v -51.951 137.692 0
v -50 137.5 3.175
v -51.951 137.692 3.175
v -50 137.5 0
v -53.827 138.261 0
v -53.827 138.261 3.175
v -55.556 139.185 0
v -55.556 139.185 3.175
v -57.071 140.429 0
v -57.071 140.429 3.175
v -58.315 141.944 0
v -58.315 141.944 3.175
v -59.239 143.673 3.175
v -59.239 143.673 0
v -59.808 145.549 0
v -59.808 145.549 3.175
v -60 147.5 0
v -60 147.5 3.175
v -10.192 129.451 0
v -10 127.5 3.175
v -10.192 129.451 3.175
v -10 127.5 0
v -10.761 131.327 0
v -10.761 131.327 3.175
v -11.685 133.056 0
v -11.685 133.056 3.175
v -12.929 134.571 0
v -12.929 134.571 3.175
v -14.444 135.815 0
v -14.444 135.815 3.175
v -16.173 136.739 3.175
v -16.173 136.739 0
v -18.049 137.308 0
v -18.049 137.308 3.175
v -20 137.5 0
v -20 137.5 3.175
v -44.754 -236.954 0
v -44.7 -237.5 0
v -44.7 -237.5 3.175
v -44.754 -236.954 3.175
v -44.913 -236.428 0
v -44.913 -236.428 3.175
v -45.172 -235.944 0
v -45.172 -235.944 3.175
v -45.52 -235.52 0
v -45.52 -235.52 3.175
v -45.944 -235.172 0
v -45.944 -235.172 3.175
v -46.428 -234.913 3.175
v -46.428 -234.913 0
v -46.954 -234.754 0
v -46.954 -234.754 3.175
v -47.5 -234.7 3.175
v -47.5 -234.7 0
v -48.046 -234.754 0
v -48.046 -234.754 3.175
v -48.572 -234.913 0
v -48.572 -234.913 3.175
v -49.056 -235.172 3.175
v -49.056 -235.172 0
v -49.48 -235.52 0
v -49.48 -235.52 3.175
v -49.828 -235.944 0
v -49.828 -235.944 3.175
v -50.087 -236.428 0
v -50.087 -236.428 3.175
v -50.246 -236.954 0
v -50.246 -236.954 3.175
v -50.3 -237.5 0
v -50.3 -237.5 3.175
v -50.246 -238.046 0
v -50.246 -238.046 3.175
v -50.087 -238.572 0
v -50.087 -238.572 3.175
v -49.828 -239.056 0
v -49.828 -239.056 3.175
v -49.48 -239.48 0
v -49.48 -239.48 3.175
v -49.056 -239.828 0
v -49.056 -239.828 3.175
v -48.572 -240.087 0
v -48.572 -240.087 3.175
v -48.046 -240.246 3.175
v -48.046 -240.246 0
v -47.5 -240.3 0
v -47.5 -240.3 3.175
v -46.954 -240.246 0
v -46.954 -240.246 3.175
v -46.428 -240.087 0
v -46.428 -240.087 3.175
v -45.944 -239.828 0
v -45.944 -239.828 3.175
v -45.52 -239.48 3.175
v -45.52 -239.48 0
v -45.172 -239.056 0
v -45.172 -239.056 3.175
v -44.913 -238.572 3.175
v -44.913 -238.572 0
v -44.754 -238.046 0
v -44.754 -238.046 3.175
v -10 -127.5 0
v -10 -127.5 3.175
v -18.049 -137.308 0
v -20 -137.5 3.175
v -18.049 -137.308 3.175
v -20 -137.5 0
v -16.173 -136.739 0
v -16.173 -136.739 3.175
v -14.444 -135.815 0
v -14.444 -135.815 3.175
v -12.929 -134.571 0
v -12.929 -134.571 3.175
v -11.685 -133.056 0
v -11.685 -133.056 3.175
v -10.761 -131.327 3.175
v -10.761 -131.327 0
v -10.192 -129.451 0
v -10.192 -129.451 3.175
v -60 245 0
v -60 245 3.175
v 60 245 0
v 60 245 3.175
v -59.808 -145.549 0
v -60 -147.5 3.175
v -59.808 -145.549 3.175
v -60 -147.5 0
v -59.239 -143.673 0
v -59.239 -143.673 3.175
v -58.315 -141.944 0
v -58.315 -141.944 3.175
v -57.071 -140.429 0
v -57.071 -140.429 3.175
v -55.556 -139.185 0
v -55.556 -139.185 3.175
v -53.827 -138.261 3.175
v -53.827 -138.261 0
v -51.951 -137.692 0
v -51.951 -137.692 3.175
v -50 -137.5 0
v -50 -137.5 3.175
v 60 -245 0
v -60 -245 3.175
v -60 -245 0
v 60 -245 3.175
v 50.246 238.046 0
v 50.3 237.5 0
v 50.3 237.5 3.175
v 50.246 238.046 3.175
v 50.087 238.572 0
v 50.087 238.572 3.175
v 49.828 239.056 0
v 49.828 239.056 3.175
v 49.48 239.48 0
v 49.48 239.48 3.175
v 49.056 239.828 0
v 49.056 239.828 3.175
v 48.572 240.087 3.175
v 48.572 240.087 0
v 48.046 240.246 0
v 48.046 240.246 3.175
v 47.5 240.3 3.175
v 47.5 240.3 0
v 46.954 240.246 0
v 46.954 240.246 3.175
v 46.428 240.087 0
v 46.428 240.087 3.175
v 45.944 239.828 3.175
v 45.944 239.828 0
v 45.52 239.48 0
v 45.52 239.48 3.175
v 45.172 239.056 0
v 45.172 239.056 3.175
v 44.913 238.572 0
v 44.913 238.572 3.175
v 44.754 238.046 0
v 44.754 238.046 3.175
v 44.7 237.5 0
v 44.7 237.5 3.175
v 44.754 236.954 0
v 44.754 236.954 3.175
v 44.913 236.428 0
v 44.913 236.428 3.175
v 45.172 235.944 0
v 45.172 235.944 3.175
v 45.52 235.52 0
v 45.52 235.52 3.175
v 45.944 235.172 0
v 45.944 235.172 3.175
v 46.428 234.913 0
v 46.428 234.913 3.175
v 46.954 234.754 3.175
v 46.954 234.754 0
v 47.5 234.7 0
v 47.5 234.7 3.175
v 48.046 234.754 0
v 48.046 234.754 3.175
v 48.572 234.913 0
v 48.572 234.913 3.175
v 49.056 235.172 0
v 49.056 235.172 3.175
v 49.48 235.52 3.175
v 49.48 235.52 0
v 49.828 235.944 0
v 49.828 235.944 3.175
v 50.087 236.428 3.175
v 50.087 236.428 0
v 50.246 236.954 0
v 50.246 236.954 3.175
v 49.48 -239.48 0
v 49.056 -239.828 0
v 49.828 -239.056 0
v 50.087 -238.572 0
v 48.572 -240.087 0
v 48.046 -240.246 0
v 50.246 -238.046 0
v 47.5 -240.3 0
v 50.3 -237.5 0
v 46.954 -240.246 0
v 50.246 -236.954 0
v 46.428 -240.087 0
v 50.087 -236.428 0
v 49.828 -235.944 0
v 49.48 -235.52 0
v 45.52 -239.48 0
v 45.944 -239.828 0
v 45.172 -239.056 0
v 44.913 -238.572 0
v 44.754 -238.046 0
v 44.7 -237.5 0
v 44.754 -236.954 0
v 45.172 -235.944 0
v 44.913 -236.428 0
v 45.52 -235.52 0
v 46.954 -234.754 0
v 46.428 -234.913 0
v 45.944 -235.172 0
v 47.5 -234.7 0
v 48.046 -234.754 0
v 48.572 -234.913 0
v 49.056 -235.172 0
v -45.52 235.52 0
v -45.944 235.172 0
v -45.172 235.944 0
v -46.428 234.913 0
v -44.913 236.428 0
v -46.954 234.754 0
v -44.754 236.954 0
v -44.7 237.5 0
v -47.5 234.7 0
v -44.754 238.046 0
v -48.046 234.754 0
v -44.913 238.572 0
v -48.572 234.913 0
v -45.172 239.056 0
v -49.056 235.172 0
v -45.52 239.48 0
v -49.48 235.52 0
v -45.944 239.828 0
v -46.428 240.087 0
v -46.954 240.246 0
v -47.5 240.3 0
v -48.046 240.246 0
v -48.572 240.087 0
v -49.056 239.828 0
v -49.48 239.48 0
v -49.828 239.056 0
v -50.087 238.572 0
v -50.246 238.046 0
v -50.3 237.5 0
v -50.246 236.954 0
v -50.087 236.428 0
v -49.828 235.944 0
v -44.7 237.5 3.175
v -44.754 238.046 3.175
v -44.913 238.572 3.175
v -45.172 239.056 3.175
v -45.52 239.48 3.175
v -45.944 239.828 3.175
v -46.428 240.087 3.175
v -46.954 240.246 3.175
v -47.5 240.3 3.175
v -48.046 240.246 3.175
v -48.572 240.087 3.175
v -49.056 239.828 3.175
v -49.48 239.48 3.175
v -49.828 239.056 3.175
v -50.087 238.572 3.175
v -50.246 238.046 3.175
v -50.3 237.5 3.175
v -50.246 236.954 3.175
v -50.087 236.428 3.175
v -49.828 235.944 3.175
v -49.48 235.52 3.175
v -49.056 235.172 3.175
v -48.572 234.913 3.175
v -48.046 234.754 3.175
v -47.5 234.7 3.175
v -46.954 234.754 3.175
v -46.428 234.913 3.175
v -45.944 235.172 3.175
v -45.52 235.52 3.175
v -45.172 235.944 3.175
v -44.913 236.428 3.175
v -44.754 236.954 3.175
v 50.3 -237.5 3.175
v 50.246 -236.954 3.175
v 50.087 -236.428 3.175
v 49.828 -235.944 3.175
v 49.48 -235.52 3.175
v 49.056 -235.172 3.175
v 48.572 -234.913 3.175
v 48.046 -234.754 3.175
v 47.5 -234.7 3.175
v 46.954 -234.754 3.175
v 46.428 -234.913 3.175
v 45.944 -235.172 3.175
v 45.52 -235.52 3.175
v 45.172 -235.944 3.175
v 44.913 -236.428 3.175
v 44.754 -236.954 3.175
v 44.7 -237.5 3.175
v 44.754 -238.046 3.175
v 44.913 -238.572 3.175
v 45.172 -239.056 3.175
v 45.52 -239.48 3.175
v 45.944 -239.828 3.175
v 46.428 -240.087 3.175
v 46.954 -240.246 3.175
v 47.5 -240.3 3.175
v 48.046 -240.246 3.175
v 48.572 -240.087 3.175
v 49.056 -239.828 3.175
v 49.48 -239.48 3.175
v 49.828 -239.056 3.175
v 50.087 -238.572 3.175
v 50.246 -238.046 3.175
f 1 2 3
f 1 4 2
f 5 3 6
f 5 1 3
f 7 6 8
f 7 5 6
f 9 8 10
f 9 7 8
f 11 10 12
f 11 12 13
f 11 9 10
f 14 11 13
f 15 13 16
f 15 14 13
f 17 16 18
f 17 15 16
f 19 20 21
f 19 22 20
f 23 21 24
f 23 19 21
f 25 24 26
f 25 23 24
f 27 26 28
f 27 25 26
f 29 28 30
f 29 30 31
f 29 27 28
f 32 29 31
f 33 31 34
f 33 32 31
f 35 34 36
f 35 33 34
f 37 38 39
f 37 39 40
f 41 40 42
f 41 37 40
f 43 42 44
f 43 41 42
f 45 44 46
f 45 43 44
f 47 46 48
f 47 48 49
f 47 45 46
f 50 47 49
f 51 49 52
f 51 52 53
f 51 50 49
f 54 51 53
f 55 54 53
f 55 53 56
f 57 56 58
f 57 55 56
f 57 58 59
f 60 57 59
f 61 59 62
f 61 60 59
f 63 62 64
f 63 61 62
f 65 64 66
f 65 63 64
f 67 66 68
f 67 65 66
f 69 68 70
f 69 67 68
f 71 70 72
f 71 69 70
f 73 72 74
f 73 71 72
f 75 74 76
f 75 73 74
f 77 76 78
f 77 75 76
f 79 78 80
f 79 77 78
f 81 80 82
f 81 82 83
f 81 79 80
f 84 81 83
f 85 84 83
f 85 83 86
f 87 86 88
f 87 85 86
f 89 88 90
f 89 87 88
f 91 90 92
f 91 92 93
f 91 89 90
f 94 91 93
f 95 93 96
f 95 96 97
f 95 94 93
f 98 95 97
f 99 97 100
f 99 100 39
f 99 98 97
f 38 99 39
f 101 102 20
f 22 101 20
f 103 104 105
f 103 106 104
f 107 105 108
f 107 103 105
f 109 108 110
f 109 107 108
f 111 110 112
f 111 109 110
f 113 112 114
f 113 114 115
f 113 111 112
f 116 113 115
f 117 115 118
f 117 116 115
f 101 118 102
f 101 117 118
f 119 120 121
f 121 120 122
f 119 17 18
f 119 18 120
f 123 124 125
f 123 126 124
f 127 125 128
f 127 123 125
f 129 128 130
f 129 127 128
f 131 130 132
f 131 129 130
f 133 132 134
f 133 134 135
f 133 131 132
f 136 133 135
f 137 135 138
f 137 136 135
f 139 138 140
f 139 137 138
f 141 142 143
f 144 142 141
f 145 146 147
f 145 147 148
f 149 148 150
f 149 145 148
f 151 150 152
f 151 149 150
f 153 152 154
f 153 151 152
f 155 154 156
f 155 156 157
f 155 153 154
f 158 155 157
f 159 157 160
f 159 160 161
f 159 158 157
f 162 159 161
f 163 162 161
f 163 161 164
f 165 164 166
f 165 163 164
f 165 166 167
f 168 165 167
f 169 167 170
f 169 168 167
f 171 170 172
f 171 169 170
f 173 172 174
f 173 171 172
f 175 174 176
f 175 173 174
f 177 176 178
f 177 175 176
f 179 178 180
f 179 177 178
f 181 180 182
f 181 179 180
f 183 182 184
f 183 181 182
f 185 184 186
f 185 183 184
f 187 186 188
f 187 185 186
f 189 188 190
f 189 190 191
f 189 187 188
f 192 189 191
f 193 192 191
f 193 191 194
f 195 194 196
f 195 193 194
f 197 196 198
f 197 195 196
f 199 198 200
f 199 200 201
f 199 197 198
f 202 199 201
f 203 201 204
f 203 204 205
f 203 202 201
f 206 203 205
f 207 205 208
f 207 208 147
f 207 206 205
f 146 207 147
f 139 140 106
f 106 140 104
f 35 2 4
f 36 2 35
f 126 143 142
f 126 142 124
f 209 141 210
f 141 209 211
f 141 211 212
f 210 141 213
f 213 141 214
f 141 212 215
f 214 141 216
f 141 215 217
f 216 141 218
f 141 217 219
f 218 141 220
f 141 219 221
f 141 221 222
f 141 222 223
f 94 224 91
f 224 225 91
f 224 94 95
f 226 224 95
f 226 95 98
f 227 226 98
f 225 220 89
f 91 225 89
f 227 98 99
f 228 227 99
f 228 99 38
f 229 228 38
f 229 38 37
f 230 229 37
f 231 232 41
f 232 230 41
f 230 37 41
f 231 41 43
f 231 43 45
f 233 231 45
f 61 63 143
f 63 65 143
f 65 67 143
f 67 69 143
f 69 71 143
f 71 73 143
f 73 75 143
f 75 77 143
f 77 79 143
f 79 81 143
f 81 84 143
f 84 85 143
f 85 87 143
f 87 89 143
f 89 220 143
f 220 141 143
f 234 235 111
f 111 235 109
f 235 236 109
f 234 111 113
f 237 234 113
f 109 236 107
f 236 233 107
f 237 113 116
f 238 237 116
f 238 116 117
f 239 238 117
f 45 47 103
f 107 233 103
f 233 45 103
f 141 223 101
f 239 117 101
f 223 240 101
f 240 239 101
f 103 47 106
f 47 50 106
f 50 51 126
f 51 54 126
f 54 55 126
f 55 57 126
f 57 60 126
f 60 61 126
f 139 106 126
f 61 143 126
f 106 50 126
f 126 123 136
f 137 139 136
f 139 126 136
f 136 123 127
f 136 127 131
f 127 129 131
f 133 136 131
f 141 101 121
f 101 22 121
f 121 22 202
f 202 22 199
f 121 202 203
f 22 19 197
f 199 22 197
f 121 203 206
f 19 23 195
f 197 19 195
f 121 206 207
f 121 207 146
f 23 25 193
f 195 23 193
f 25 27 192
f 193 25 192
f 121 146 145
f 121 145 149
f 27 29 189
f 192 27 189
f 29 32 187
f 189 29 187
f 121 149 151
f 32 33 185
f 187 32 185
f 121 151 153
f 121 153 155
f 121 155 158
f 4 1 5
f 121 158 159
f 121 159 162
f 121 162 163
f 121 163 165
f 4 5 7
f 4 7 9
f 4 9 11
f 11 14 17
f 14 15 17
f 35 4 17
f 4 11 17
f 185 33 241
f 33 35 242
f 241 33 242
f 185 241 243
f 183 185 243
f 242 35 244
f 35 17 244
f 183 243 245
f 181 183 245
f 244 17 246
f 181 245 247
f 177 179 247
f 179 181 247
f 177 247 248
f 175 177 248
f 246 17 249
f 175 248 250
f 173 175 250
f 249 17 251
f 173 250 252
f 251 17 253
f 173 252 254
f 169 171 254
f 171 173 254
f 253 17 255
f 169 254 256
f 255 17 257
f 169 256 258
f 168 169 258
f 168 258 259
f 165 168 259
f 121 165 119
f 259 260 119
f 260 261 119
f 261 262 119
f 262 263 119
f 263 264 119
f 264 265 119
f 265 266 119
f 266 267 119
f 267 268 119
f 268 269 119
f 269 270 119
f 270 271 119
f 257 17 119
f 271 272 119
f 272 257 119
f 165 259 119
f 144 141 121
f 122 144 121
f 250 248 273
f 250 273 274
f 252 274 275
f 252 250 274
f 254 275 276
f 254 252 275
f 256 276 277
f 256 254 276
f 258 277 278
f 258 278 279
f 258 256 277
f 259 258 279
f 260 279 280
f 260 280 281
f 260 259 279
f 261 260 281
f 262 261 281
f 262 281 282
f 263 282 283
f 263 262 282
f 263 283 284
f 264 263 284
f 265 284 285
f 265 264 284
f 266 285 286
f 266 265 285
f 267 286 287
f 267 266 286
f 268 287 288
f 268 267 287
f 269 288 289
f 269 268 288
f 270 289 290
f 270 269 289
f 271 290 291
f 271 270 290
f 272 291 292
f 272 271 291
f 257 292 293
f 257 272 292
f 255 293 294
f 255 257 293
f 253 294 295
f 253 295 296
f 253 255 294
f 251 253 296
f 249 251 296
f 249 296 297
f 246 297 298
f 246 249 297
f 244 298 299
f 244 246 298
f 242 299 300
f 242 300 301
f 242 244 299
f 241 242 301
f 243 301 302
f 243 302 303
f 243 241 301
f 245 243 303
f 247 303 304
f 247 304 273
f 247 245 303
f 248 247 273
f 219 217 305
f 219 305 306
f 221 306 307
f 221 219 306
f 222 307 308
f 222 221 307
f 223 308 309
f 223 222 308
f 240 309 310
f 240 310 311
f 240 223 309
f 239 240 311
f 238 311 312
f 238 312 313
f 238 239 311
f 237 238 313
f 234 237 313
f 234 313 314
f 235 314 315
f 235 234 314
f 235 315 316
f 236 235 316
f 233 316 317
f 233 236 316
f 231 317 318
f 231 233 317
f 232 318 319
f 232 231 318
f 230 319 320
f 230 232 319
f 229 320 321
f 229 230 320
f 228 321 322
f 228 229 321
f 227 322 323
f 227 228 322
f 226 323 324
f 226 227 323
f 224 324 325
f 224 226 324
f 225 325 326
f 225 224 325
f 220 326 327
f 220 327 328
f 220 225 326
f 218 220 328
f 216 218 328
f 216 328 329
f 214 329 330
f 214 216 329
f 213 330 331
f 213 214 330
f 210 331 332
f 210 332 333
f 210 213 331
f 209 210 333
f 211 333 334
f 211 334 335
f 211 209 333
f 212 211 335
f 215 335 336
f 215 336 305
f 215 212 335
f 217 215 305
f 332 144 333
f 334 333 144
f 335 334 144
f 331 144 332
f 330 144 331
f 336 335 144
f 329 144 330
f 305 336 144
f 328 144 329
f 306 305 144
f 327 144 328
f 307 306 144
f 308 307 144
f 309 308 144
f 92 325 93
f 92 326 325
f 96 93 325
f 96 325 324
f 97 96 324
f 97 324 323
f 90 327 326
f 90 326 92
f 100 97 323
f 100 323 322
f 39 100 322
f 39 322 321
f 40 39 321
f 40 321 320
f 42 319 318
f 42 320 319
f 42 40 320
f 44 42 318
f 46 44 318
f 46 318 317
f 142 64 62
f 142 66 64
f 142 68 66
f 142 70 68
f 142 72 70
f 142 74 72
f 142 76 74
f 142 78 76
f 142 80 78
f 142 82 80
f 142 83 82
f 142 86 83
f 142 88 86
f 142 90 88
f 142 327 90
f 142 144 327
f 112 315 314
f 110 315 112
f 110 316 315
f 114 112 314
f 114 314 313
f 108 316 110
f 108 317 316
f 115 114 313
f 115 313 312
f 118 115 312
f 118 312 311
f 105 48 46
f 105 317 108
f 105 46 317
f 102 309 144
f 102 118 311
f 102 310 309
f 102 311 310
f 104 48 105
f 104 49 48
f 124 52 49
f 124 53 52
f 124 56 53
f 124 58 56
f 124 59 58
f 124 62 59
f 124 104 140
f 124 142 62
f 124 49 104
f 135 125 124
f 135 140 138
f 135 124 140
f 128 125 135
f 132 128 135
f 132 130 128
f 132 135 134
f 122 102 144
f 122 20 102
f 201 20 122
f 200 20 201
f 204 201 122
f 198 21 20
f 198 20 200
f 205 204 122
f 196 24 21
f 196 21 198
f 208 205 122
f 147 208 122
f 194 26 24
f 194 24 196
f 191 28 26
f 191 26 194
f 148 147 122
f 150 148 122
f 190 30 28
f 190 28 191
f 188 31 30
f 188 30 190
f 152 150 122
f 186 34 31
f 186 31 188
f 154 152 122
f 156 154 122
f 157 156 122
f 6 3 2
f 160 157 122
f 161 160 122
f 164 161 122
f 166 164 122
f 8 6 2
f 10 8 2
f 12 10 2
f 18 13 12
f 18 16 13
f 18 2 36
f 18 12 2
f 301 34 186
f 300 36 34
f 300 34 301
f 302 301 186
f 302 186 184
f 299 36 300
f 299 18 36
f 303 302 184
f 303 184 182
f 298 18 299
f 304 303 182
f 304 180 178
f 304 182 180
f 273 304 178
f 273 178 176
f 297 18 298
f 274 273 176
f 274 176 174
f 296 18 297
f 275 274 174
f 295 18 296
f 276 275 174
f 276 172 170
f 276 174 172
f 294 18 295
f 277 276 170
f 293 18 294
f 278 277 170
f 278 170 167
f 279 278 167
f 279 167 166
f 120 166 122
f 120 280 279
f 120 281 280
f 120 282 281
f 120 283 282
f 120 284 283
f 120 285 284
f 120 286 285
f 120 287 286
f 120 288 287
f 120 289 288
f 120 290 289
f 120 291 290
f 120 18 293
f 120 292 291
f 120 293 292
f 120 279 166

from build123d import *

# Parameters (mm, degrees)
SKETCH1_W           = 500
SKETCH1_H           = 120
SKETCH1_R           = 2.8
BOSS_EXTRUDE1_DEPTH = 3.175
SKETCH2_W           = 50
SKETCH2_H           = 275
CUT_EXTRUDE1_DEPTH  = 258.11880644
FILLET1_R           = 10
SKETCH3_W           = 120
SKETCH3_H           = 5
CUT_EXTRUDE2_DEPTH  = 258.11880644


with BuildPart() as part:
    # Sketch1 → Boss-Extrude1 (new body)
    with BuildSketch(Plane(origin=(0, 0, 0), x_dir=(0, 1, 0), z_dir=(0, 0, 1))):
        Rectangle(SKETCH1_W, SKETCH1_H)
        with Locations(Location((-237.5, 47.5, 0), (0, 0, 270))):
            Circle(SKETCH1_R, mode=Mode.SUBTRACT)
        with Locations(Location((-237.5, -47.5, 0), (0, 0, 270))):
            Circle(SKETCH1_R, mode=Mode.SUBTRACT)
        with Locations(Location((237.5, 47.5, 0), (0, 0, 270))):
            Circle(SKETCH1_R, mode=Mode.SUBTRACT)
        with Locations(Location((237.5, -47.5, 0), (0, 0, 270))):
            Circle(SKETCH1_R, mode=Mode.SUBTRACT)
    extrude(amount=BOSS_EXTRUDE1_DEPTH)

    # Sketch2 → Cut-Extrude1 (cut, through all)
    with BuildSketch(Plane.XY.offset(3.175)):
        with Locations((-35, 0)):
            Rectangle(SKETCH2_W, SKETCH2_H)
    extrude(amount=-CUT_EXTRUDE1_DEPTH, mode=Mode.SUBTRACT)

    # Fillet1
    fillet1_edges = [part.edges().sort_by_distance(p)[0] for p in [
        (-60, -137.5, 1.5875),
        (-60, 137.5, 1.5875),
        (-10, 137.5, 1.5875),
        (-10, -137.5, 1.5875),
    ]]
    fillet(fillet1_edges, radius=FILLET1_R)

    # Sketch3 → Cut-Extrude2 (cut, through all)
    with BuildSketch(Plane.XY.offset(3.175)):
        with Locations((0, 247.5)):
            Rectangle(SKETCH3_W, SKETCH3_H)
        with Locations((0, -247.5)):
            Rectangle(SKETCH3_W, SKETCH3_H)
    extrude(amount=-CUT_EXTRUDE2_DEPTH, mode=Mode.SUBTRACT)


solid = part.part
